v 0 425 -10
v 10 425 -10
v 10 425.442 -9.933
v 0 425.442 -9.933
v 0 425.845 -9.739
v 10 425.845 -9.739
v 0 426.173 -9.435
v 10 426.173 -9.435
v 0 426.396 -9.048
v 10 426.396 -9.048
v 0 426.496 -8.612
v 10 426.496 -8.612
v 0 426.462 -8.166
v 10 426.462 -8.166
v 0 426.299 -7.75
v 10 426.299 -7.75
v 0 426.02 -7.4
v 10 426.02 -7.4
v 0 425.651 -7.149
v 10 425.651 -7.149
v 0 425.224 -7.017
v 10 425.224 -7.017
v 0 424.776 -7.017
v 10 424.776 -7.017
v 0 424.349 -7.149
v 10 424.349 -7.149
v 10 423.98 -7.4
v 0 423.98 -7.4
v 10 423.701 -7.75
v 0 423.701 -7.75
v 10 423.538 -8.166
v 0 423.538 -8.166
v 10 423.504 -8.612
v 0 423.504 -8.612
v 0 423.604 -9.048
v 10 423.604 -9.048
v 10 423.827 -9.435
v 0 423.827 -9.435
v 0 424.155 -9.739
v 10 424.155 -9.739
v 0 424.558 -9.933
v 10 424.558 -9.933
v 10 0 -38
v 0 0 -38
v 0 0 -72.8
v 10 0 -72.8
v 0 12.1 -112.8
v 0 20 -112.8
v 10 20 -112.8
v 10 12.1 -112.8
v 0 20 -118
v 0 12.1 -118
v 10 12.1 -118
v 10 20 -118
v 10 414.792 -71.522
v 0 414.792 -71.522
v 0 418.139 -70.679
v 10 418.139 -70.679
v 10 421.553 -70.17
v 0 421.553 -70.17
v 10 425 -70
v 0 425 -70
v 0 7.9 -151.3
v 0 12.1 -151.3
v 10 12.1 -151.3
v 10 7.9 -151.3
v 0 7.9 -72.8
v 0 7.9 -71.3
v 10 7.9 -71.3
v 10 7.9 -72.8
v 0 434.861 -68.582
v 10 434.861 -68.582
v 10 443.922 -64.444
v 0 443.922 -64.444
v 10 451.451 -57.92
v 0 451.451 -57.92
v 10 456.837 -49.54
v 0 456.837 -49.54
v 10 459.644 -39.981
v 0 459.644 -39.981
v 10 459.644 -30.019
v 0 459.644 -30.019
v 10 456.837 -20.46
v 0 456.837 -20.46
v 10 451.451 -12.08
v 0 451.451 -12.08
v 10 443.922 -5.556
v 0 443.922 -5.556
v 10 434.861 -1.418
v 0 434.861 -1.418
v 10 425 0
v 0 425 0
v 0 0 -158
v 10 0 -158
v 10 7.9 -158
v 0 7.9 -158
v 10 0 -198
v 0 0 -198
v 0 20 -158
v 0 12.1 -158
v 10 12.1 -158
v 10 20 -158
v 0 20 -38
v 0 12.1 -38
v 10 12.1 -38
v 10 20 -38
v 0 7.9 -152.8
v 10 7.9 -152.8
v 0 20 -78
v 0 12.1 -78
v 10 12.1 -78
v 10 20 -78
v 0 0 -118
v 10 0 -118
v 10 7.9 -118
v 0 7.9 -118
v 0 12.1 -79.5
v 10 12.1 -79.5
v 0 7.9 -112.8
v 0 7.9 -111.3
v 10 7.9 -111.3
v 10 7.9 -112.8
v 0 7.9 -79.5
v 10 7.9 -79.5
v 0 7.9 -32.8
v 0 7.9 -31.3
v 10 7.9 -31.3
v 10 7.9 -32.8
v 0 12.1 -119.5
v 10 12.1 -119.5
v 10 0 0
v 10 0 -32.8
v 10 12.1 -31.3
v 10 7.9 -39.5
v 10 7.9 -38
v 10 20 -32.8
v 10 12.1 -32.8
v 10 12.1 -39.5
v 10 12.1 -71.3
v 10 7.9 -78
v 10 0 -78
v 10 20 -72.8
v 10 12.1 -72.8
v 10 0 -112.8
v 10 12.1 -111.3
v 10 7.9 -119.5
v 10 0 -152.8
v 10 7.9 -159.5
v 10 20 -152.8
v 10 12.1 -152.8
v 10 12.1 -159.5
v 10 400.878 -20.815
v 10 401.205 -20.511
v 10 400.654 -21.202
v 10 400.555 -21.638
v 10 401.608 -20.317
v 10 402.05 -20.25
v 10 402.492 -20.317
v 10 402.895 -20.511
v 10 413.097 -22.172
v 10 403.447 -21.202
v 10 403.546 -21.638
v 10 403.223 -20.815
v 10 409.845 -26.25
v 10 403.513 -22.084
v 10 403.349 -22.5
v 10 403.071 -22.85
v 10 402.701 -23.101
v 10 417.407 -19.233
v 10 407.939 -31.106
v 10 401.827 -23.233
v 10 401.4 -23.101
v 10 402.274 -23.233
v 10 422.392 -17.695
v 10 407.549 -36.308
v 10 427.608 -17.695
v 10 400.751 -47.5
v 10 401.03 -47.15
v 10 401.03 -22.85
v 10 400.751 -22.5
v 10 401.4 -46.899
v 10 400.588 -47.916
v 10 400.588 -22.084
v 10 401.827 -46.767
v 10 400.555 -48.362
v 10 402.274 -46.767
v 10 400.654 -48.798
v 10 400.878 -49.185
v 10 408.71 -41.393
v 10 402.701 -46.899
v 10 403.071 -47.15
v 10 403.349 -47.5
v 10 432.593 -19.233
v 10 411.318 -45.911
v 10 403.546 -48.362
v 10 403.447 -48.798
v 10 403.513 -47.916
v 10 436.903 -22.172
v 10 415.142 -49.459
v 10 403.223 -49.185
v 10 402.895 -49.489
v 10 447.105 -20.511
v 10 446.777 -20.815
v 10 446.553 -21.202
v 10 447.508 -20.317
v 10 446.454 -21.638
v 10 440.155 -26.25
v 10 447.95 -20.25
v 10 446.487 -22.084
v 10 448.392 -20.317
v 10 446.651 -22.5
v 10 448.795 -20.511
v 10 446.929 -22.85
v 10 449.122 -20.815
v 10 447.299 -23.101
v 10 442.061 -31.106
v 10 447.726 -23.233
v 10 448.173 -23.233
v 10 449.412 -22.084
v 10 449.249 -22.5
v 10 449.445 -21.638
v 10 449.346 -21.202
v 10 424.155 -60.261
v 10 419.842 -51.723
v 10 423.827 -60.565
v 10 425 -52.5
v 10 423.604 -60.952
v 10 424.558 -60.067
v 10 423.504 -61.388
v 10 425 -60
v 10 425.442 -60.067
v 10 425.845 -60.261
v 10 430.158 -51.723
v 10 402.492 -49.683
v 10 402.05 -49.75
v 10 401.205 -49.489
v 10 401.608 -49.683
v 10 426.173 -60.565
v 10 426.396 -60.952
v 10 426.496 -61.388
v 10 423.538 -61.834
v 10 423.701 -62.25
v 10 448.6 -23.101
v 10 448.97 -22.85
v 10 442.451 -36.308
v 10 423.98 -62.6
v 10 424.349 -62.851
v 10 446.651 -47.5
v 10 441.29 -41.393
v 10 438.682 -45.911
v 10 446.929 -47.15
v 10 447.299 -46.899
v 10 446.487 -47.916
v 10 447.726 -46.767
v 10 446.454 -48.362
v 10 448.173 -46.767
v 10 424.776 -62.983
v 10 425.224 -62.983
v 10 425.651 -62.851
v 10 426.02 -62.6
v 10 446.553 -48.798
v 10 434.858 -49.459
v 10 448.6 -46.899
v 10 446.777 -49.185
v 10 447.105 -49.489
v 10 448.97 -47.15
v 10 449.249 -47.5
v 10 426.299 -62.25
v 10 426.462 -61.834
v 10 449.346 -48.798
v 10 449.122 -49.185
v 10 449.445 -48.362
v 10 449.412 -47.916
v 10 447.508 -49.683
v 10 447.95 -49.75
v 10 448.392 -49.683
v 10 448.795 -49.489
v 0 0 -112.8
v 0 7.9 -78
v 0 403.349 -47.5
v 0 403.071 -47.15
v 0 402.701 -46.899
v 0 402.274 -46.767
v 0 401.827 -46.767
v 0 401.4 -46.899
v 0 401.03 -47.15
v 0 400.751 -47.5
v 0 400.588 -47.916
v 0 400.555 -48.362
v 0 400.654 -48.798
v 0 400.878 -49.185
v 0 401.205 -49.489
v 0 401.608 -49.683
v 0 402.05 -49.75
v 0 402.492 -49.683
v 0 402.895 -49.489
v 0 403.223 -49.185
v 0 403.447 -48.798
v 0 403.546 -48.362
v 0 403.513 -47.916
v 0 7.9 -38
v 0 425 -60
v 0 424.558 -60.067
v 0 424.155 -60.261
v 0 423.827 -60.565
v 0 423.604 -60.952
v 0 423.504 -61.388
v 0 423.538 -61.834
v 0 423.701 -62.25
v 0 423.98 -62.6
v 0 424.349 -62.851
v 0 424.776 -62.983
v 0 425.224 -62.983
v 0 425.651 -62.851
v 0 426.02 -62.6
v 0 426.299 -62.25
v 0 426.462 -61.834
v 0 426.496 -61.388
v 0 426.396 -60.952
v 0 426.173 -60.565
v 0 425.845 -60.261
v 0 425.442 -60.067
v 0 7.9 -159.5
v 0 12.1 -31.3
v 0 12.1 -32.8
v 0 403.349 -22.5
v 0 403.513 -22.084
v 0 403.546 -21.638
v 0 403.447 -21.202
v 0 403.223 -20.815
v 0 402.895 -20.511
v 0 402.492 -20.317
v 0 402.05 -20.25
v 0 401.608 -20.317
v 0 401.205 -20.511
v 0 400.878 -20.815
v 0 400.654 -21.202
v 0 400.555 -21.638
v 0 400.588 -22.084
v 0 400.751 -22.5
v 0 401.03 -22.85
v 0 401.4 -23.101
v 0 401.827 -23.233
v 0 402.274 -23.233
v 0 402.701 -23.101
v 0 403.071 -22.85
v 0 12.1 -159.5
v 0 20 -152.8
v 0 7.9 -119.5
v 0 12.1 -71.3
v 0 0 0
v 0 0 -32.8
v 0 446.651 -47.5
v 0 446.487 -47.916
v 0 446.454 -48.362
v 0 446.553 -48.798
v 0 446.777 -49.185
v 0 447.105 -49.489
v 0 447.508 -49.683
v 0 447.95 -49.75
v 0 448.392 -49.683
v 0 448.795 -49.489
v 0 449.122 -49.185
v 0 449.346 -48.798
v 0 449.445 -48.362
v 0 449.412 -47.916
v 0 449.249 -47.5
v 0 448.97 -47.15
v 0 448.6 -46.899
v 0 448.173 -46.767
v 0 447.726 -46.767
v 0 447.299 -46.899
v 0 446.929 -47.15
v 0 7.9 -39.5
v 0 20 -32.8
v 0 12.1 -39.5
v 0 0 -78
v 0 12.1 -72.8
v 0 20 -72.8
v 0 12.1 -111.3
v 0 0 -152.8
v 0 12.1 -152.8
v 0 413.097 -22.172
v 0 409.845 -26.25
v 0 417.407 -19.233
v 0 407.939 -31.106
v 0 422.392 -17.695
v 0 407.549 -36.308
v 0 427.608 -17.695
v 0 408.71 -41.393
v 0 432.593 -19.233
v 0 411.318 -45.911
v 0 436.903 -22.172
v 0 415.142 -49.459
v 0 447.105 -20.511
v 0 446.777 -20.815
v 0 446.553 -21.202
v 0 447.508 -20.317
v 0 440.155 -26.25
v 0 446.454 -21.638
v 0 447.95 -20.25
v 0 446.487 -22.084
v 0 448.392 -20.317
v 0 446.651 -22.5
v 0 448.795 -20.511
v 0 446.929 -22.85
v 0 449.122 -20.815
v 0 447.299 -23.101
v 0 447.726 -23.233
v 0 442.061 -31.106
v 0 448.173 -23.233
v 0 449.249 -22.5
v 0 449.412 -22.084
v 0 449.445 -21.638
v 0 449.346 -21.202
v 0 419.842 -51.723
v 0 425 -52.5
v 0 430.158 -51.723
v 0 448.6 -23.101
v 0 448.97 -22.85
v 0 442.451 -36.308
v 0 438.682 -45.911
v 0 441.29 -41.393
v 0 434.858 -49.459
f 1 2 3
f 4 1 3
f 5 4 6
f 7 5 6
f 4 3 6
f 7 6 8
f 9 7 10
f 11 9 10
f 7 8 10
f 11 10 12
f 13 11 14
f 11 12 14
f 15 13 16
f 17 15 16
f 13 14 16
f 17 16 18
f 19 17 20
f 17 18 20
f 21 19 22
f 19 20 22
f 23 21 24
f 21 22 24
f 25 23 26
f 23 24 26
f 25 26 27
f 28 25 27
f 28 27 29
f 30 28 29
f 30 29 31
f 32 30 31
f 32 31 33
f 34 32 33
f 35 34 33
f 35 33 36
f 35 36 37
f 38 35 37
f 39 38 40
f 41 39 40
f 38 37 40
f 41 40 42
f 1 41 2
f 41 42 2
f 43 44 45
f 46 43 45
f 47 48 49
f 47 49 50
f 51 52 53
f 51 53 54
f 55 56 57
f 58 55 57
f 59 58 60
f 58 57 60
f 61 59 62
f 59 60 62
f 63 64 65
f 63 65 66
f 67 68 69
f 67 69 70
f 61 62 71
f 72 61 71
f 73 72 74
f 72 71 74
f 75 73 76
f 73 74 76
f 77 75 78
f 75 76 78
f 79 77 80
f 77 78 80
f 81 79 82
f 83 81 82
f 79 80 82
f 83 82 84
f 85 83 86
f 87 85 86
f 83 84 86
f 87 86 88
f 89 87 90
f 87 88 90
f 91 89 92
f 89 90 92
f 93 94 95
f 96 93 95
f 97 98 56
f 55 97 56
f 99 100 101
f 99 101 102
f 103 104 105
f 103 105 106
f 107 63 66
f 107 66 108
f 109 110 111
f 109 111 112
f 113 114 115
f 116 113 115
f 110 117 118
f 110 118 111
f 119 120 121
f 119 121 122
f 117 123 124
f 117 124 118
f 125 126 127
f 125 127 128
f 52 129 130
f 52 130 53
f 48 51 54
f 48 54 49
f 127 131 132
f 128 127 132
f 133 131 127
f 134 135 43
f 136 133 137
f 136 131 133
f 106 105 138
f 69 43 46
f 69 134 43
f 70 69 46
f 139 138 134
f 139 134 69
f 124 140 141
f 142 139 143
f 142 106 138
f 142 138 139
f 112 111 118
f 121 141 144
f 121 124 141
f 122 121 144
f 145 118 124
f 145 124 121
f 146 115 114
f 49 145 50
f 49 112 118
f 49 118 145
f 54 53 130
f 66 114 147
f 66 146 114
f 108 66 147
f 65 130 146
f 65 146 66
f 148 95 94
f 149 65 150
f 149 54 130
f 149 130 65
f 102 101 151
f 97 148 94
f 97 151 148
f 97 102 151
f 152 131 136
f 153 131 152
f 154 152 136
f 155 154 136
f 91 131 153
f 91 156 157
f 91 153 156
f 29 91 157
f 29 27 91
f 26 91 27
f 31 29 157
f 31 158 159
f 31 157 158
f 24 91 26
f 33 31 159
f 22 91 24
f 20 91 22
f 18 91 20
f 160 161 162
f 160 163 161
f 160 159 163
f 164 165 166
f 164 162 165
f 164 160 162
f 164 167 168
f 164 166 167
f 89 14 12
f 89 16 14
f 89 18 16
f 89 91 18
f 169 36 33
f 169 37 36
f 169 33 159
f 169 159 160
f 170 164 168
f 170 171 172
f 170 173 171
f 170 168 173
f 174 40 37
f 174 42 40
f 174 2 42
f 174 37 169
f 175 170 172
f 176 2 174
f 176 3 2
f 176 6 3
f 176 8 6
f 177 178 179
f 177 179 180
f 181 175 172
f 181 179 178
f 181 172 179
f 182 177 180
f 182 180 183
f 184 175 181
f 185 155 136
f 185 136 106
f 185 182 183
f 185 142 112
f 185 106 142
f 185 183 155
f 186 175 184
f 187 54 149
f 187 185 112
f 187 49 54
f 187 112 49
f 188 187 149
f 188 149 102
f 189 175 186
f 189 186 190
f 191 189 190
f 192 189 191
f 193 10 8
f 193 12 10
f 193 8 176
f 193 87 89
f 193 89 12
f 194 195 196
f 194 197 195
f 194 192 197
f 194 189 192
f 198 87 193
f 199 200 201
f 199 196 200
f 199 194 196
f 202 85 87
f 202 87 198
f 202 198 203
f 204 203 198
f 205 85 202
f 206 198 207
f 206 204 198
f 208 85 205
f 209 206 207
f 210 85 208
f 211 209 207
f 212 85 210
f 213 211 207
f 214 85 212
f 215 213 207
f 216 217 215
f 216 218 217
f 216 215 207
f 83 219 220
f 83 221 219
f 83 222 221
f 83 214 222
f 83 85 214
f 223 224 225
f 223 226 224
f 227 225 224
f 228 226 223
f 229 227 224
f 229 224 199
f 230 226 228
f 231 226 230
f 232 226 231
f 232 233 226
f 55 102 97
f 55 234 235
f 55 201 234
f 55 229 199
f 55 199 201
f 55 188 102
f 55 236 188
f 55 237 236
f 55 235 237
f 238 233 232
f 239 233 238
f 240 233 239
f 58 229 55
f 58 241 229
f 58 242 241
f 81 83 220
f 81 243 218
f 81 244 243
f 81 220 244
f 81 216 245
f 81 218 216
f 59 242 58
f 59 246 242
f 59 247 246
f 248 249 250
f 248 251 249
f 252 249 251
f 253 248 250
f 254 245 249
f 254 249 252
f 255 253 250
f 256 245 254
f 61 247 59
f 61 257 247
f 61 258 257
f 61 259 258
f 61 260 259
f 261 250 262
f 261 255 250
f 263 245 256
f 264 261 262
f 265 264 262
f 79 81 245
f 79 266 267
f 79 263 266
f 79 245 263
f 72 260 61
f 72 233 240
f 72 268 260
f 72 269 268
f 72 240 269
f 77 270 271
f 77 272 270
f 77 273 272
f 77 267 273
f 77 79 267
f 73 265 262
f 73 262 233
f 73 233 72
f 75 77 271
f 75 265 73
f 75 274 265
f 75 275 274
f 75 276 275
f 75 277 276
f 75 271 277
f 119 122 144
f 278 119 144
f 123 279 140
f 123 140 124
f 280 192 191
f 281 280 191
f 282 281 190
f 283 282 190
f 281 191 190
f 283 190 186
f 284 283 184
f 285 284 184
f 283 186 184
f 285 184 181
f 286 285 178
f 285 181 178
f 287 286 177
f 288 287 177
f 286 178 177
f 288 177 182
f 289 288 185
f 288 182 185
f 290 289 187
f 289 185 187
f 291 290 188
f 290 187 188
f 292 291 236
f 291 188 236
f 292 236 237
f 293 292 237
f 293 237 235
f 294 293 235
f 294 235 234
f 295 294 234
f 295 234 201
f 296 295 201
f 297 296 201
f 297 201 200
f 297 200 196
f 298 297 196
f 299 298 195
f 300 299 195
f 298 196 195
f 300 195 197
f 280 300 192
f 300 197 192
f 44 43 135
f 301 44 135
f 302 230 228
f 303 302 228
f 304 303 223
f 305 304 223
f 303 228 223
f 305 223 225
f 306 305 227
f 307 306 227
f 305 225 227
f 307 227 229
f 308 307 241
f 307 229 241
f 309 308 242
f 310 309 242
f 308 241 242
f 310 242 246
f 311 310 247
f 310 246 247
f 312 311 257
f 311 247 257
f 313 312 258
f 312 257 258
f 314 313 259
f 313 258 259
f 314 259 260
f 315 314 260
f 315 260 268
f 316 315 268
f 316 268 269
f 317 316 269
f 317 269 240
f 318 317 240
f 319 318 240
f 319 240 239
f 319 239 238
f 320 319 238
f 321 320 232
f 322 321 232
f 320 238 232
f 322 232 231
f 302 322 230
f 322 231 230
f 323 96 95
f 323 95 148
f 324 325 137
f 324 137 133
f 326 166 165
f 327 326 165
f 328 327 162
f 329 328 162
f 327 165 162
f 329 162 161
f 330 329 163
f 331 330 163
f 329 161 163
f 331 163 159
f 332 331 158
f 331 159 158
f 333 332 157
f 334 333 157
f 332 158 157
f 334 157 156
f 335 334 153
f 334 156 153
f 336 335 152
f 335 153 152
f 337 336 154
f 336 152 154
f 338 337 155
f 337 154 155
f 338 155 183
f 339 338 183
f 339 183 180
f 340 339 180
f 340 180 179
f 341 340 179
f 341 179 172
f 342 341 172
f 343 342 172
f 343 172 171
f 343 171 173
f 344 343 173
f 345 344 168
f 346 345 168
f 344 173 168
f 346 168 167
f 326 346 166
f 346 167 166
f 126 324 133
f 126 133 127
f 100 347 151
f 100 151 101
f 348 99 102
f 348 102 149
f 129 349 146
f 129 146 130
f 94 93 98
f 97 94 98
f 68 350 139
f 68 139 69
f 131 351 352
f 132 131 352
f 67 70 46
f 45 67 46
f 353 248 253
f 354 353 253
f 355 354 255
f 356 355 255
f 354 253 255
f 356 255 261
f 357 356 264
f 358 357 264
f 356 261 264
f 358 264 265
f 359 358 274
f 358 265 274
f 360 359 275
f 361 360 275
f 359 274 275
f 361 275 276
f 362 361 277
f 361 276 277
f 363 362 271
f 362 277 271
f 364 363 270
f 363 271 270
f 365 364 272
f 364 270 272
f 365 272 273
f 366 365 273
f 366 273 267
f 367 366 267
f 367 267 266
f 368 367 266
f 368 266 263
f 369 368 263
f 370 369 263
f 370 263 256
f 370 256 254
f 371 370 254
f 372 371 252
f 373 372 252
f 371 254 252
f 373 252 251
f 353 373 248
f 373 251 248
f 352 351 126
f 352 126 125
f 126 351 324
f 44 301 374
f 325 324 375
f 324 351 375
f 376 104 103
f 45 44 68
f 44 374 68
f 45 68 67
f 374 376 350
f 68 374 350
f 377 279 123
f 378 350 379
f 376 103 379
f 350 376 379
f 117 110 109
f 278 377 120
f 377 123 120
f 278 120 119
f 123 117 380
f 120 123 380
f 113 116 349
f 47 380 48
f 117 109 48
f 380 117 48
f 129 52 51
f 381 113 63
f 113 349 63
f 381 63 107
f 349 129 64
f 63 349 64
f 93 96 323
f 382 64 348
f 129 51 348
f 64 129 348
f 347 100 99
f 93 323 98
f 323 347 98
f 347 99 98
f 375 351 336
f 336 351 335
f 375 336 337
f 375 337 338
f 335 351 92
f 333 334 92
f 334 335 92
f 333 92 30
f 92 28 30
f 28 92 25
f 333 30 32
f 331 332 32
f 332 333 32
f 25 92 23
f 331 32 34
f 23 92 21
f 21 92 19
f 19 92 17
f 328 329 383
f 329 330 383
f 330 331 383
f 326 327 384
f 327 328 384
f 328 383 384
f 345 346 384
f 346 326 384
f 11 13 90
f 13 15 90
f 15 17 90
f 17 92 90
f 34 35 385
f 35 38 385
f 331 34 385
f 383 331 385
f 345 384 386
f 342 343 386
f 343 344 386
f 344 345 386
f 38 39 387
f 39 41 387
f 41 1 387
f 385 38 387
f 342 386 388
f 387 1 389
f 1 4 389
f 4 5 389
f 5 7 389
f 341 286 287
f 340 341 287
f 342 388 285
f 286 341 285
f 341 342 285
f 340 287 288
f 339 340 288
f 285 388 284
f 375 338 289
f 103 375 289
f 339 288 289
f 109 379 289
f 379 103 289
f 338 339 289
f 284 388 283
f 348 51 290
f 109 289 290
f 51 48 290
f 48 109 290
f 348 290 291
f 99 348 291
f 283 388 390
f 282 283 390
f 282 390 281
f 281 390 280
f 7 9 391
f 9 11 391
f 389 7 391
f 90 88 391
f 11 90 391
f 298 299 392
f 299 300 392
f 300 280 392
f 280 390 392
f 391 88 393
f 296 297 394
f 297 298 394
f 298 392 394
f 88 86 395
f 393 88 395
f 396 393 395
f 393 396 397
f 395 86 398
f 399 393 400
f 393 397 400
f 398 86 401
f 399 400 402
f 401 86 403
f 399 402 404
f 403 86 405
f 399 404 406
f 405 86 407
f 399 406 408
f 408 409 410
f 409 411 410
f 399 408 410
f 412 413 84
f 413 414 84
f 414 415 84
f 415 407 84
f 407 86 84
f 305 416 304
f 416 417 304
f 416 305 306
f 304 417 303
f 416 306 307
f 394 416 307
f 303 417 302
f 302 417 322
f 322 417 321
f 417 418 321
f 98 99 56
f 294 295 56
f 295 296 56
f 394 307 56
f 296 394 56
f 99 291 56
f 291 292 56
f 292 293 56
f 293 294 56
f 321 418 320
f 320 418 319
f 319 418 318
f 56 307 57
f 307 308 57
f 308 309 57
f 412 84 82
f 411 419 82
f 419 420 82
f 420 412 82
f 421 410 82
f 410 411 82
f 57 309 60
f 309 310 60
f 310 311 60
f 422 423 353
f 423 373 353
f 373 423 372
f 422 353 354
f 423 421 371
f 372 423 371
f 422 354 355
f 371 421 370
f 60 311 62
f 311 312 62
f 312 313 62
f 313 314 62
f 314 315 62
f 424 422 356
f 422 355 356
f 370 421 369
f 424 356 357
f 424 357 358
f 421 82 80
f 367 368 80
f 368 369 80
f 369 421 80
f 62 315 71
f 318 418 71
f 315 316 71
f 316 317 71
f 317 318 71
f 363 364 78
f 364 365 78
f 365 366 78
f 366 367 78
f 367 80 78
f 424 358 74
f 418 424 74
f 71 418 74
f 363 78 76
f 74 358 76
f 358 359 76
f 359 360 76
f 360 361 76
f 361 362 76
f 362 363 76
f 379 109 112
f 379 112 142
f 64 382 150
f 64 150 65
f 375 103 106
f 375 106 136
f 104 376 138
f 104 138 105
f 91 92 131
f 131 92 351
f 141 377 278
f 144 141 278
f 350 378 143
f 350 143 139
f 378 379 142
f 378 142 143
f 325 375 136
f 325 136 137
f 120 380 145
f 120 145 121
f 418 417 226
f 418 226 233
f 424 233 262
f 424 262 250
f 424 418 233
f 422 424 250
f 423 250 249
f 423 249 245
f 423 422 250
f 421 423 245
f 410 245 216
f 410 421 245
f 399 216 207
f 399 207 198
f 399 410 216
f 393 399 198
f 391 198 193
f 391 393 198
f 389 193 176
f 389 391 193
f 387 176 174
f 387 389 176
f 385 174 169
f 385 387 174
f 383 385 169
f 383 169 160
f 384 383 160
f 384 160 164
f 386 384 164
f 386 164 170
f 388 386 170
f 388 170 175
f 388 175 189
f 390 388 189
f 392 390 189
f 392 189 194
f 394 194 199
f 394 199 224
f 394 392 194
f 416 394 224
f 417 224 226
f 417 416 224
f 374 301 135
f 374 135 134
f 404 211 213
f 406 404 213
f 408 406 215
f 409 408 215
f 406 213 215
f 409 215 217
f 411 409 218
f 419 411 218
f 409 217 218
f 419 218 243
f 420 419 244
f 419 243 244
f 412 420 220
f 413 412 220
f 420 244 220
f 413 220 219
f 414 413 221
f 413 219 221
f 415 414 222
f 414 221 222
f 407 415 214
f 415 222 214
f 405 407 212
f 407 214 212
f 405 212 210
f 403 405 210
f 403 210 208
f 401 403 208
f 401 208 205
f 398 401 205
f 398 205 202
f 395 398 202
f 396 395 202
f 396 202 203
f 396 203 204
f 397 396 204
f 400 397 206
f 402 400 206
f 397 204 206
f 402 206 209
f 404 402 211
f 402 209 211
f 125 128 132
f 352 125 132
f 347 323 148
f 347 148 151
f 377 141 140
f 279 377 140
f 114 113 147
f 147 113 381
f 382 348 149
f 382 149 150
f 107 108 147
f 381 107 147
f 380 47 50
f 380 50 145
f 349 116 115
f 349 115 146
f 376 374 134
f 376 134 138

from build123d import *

# Parameters (mm, degrees)
SKETCH_2_R               = 17.5
EXTRUDE_1_DEPTH          = 10
CUT_EXTRUDE_2_DEPTH      = 10
PATTERN_LINEAR_1_COUNT   = 4
PATTERN_LINEAR_1_PITCH   = 40
SKETCH_6_R               = 1.5
CUT_EXTRUDE_3_DEPTH      = 10
PATTERN_CIRCULAR_1_COUNT = 6


with BuildPart() as part:
    # Эскиз2 → Бобышка-Вытянуть1 (new body)
    with BuildSketch(Plane(origin=(0, 0, 0), x_dir=(0, 0, -1), z_dir=(1, 0, 0))):
        with BuildLine():
            Line((0, 425), (0, 0))
            Line((0, 0), (198, 0))
            Line((198, 0), (71.521752772, 414.791818842))
            ThreePointArc((71.521752772, 414.791818842), (70.382528595, 419.839508404), (70, 425))
            ThreePointArc((70, 425), (35, 460), (0, 425))
        make_face()
        with Locations((35, 425)):
            Circle(SKETCH_2_R, mode=Mode.SUBTRACT)
    extrude(amount=EXTRUDE_1_DEPTH)

    # Эскиз3 → Вырез-Вытянуть2 (cut)
    with BuildSketch(Plane.ZY):
        Polygon((-158, 0), (-158, 7.9), (-159.5, 7.9), (-159.5, 12.1), (-158, 12.1), (-158, 20), (-152.8, 20), (-152.8, 12.1), (-151.3, 12.1), (-151.3, 7.9), (-152.8, 7.9), (-152.8, 0), align=None)
    cut_extrude_2 = extrude(amount=-CUT_EXTRUDE_2_DEPTH, mode=Mode.SUBTRACT)

    # Линейный массив1: Вырез-Вытянуть2 ×4
    with Locations(*[(0, 0, i * PATTERN_LINEAR_1_PITCH) for i in range(1, PATTERN_LINEAR_1_COUNT)]):
        add(cut_extrude_2, mode=Mode.SUBTRACT)

    # Эскиз6 → Вырез-Вытянуть3 (cut)
    with BuildSketch(Plane(origin=(10, 0, 0), x_dir=(0, 0, -1), z_dir=(1, 0, 0))):
        with Locations((8.5, 425)):
            Circle(SKETCH_6_R)
    cut_extrude_3 = extrude(amount=-CUT_EXTRUDE_3_DEPTH, mode=Mode.SUBTRACT)

    # Круговой массив1: Вырез-Вытянуть3 ×6 about axis
    pattern_circular_1_axis = Axis((0, 425, -35), (1, 0, 0))
    for i in range(1, PATTERN_CIRCULAR_1_COUNT):
        add(cut_extrude_3.rotate(pattern_circular_1_axis, i * 360 / PATTERN_CIRCULAR_1_COUNT), mode=Mode.SUBTRACT)


solid = part.part
